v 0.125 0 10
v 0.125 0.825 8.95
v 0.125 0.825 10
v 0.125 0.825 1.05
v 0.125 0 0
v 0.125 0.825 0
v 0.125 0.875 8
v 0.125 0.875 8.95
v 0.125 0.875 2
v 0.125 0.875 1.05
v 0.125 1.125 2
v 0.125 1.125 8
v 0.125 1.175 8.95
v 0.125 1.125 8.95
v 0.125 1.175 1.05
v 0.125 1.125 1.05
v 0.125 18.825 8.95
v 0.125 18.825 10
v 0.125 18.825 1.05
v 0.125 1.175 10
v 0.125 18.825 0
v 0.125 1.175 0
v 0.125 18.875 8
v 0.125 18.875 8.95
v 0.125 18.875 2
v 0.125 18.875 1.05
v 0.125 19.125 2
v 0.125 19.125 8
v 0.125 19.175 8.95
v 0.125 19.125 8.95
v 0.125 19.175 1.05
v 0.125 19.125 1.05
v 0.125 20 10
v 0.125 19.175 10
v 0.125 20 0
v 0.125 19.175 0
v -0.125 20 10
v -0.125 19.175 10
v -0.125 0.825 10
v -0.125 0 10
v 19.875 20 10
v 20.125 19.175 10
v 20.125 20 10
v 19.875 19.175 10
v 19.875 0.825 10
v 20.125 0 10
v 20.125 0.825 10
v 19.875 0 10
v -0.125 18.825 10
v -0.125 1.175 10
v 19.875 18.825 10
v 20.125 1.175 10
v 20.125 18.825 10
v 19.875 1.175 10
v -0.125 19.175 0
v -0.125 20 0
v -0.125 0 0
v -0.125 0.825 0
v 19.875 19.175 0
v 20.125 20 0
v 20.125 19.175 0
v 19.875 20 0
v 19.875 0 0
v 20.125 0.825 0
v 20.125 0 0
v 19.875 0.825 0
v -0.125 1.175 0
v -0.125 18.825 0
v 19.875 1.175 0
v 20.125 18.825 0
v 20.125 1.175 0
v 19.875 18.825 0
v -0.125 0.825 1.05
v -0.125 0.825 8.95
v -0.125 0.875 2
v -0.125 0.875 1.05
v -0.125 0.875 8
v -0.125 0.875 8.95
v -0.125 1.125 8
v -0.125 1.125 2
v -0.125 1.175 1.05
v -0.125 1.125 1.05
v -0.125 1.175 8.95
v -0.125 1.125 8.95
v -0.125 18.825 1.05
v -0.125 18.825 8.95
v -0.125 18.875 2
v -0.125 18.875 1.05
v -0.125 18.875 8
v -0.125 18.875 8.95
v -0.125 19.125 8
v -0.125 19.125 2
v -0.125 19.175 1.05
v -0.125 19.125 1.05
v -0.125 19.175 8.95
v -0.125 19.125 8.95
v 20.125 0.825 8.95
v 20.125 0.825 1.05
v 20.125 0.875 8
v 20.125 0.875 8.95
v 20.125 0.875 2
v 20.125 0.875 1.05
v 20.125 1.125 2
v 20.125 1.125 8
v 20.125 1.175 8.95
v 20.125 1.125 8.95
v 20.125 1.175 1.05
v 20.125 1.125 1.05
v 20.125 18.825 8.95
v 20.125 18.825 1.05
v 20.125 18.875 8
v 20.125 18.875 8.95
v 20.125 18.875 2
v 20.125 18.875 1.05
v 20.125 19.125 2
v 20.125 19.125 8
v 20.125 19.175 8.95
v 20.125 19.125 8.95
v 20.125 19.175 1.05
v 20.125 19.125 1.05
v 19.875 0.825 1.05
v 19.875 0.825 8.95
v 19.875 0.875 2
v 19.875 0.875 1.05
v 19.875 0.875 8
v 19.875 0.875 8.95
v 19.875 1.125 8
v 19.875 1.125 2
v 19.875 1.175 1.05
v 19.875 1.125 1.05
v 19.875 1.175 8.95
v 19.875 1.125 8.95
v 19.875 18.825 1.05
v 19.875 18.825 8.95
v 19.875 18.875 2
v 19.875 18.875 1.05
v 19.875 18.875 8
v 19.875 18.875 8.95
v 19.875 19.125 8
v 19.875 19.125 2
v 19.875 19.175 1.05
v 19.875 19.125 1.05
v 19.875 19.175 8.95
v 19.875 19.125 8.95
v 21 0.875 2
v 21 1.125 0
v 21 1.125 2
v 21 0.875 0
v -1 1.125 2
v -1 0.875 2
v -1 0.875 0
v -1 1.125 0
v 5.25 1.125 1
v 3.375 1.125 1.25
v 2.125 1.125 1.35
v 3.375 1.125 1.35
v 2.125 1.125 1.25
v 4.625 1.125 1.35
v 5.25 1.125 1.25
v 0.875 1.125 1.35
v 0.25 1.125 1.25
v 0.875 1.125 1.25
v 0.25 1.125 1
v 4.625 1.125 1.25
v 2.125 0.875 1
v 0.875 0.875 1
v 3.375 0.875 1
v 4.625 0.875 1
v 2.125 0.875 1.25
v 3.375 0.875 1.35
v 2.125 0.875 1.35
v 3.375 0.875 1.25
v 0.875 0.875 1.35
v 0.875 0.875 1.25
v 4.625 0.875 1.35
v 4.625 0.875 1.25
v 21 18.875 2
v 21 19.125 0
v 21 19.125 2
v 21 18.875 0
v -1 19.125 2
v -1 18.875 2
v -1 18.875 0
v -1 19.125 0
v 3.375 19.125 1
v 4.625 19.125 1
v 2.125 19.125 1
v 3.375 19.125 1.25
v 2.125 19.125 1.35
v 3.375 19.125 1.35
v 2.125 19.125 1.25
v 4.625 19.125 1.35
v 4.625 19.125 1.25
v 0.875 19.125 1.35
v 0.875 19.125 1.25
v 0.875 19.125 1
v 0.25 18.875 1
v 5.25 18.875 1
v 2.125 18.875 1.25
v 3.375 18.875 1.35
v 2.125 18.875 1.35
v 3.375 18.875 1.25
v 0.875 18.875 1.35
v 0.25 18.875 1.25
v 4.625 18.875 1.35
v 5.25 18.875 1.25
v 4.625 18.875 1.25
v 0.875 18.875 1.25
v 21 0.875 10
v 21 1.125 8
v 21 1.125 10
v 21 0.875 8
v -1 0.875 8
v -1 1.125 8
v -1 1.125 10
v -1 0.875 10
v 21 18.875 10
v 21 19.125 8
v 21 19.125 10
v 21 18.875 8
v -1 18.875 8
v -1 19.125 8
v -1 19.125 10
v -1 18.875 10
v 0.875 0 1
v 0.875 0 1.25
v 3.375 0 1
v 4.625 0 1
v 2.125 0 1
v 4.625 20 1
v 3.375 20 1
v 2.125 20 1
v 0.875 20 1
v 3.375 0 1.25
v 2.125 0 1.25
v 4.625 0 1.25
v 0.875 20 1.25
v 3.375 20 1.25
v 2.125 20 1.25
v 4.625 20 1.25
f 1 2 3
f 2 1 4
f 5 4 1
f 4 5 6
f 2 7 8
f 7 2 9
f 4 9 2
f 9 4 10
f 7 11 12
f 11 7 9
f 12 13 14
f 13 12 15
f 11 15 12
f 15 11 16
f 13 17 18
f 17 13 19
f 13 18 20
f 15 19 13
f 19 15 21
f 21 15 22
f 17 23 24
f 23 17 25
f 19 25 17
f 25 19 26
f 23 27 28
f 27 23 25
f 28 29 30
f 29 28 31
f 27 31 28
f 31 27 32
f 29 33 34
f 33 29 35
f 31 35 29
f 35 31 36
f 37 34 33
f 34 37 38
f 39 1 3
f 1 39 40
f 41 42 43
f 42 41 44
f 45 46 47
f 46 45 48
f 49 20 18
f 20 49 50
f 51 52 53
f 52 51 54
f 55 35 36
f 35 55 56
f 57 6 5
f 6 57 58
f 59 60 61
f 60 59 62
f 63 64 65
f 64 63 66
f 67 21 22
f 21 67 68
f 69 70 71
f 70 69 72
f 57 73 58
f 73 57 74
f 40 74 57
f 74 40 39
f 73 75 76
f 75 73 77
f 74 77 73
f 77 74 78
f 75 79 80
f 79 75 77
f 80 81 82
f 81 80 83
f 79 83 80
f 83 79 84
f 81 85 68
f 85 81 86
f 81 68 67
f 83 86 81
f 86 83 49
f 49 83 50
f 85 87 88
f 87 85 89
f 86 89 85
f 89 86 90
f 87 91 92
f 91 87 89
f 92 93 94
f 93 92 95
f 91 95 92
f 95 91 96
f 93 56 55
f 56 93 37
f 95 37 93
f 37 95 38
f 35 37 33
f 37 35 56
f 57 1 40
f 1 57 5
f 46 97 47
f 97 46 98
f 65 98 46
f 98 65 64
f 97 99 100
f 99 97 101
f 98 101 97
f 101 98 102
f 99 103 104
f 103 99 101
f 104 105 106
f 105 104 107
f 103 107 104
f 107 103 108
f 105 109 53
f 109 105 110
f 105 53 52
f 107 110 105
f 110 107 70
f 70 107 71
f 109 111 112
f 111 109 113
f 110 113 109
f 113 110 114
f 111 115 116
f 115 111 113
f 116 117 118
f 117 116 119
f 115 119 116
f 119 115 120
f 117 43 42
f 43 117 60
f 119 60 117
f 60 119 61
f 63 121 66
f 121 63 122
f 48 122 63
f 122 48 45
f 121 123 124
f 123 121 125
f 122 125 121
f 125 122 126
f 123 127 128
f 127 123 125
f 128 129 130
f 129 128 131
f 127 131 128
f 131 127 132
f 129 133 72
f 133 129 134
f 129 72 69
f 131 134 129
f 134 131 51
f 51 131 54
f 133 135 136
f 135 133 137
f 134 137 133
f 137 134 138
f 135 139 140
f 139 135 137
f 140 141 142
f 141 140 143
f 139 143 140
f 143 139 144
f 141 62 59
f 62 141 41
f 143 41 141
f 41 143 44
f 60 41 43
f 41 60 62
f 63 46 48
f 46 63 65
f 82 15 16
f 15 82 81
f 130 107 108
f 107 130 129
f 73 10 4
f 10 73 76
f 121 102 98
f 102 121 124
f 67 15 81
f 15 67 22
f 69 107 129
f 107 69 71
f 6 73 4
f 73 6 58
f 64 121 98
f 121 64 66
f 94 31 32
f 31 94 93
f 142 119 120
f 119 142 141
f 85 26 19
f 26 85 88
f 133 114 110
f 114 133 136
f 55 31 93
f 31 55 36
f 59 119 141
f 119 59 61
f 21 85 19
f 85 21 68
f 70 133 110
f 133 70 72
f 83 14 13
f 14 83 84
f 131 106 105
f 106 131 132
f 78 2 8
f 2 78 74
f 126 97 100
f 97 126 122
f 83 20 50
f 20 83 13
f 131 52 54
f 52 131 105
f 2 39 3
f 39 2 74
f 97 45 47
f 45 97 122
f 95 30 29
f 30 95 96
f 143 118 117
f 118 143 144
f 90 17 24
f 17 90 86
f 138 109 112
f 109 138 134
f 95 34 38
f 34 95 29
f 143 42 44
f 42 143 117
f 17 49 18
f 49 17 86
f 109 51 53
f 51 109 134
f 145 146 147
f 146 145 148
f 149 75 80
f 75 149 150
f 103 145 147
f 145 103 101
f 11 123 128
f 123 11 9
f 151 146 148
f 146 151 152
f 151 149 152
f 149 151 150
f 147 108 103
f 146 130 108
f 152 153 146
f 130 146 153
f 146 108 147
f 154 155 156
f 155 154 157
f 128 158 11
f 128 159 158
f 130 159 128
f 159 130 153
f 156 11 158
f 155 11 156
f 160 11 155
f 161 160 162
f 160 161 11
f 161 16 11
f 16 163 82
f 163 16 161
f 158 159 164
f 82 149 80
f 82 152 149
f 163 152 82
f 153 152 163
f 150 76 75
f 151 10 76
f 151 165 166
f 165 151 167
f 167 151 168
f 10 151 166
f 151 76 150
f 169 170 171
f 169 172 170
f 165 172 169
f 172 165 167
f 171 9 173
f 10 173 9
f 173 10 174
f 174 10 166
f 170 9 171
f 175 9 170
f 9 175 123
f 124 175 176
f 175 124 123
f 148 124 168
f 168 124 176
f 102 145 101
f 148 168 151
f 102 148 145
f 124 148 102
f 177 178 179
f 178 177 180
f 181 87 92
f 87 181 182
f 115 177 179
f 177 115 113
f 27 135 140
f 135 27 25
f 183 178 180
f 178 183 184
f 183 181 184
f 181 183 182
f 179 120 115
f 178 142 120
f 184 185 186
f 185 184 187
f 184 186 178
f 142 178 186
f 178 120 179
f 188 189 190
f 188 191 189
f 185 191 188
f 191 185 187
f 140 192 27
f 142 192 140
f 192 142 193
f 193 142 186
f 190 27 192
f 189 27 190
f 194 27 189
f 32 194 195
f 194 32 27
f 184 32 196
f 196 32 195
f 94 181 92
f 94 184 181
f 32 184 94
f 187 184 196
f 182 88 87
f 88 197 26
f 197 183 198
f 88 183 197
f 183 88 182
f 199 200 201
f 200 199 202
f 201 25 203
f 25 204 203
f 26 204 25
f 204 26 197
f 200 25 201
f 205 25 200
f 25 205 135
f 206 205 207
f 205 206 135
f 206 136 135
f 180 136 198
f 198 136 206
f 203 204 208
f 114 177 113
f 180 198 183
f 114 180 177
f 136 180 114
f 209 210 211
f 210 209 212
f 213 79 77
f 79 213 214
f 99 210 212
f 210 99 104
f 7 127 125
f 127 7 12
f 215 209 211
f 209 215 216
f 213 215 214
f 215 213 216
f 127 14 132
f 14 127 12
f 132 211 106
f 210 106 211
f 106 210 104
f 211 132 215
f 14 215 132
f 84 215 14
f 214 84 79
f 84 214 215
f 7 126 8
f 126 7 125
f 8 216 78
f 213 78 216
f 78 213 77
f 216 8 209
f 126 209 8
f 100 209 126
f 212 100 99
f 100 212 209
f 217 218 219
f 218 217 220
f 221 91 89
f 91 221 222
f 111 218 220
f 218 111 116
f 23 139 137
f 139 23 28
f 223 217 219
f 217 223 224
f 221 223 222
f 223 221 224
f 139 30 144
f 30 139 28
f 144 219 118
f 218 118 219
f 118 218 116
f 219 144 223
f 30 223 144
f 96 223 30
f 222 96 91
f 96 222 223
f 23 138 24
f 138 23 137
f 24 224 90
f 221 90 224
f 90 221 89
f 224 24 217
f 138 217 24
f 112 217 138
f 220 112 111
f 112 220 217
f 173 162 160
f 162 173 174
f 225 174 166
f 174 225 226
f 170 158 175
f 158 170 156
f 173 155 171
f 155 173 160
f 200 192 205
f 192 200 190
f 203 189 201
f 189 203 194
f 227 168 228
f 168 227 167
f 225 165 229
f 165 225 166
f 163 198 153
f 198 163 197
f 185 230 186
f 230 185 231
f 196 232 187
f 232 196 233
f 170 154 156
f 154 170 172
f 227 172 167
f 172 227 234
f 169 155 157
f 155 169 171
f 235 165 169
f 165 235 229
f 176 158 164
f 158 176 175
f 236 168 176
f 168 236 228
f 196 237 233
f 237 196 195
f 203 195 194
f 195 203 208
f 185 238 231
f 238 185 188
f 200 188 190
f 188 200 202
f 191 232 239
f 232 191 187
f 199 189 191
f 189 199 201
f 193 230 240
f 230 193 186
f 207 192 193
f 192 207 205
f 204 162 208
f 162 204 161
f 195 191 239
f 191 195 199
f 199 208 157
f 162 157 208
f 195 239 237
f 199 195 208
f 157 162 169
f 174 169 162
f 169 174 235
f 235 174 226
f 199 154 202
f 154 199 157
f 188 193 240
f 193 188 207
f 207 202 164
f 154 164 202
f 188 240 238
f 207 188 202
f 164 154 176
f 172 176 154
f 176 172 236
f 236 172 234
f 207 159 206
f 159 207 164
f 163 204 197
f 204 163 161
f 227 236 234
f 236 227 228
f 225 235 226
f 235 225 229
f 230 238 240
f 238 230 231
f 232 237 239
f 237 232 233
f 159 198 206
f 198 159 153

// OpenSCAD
thickness = 0.25;

width = 20;
length = 20;
height = 10;

// width and height of tank base plate
base_width = width/4;
base_height = 1;

// height of side supports
//side_support_height = height/2; // full side walls
side_support_height = 2;

// amount faces extend past each other at corners
overhang = 1;

// for minor corrections
epsilon = 0.01;

vert_faces();
side_supports();
tank_base();

module vert_faces() {
	difference() {
		union() {
			vert_face(x=0);
			vert_face(x=length);
		}
		side_support_base(clearance=0.1, height_scale=0.5);
		side_support_top(clearance=0.1, height_scale=0.5);
	}
}

module vert_face(x) {
	translate([x-thickness/2,0,0])
		cube([thickness,width,height]);
}

module tank_base(clearance=0) {
	translate([thickness,0,base_height])
	difference() {
		cube([base_width, length, thickness + clearance]);
		tank_base_cutouts(clearance);
		translate([0,length-overhang-thickness/2,0])
			tank_base_cutouts(clearance);
	}
}

module tank_base_cutouts(clearance=0) {
	cube([base_width/8, overhang+thickness/2, thickness+clearance]);
	translate([3*base_width/8,0,0])
		cube([base_width/4, overhang+thickness/2, thickness+clearance]);
	translate([7*base_width/8,0,0])
		cube([base_width/8+epsilon, overhang+thickness/2, thickness+clearance]);
}

module side_supports() {
	difference() {
		union() {
			side_support_base();
			side_support_top();
		}
		vert_faces();
		tank_base(clearance=0.1);
	}
}

module side_support_top(clearance=0, height_scale=1) {
	translate([0,0,height])
	side_support_base(clearance=clearance, height_scale=-height_scale);
}

module side_support_base(clearance=0, height_scale=1) {
	scale([1,1,height_scale])
		union() {
			side_support(y=overhang, clearance=clearance);
			side_support(y=width-overhang, clearance=clearance);
		}
}

module side_support(y, clearance) {
	translate([-overhang,y-thickness/2-clearance/2,0])
		cube([length+overhang*2, thickness+clearance, side_support_height+clearance]);
}
